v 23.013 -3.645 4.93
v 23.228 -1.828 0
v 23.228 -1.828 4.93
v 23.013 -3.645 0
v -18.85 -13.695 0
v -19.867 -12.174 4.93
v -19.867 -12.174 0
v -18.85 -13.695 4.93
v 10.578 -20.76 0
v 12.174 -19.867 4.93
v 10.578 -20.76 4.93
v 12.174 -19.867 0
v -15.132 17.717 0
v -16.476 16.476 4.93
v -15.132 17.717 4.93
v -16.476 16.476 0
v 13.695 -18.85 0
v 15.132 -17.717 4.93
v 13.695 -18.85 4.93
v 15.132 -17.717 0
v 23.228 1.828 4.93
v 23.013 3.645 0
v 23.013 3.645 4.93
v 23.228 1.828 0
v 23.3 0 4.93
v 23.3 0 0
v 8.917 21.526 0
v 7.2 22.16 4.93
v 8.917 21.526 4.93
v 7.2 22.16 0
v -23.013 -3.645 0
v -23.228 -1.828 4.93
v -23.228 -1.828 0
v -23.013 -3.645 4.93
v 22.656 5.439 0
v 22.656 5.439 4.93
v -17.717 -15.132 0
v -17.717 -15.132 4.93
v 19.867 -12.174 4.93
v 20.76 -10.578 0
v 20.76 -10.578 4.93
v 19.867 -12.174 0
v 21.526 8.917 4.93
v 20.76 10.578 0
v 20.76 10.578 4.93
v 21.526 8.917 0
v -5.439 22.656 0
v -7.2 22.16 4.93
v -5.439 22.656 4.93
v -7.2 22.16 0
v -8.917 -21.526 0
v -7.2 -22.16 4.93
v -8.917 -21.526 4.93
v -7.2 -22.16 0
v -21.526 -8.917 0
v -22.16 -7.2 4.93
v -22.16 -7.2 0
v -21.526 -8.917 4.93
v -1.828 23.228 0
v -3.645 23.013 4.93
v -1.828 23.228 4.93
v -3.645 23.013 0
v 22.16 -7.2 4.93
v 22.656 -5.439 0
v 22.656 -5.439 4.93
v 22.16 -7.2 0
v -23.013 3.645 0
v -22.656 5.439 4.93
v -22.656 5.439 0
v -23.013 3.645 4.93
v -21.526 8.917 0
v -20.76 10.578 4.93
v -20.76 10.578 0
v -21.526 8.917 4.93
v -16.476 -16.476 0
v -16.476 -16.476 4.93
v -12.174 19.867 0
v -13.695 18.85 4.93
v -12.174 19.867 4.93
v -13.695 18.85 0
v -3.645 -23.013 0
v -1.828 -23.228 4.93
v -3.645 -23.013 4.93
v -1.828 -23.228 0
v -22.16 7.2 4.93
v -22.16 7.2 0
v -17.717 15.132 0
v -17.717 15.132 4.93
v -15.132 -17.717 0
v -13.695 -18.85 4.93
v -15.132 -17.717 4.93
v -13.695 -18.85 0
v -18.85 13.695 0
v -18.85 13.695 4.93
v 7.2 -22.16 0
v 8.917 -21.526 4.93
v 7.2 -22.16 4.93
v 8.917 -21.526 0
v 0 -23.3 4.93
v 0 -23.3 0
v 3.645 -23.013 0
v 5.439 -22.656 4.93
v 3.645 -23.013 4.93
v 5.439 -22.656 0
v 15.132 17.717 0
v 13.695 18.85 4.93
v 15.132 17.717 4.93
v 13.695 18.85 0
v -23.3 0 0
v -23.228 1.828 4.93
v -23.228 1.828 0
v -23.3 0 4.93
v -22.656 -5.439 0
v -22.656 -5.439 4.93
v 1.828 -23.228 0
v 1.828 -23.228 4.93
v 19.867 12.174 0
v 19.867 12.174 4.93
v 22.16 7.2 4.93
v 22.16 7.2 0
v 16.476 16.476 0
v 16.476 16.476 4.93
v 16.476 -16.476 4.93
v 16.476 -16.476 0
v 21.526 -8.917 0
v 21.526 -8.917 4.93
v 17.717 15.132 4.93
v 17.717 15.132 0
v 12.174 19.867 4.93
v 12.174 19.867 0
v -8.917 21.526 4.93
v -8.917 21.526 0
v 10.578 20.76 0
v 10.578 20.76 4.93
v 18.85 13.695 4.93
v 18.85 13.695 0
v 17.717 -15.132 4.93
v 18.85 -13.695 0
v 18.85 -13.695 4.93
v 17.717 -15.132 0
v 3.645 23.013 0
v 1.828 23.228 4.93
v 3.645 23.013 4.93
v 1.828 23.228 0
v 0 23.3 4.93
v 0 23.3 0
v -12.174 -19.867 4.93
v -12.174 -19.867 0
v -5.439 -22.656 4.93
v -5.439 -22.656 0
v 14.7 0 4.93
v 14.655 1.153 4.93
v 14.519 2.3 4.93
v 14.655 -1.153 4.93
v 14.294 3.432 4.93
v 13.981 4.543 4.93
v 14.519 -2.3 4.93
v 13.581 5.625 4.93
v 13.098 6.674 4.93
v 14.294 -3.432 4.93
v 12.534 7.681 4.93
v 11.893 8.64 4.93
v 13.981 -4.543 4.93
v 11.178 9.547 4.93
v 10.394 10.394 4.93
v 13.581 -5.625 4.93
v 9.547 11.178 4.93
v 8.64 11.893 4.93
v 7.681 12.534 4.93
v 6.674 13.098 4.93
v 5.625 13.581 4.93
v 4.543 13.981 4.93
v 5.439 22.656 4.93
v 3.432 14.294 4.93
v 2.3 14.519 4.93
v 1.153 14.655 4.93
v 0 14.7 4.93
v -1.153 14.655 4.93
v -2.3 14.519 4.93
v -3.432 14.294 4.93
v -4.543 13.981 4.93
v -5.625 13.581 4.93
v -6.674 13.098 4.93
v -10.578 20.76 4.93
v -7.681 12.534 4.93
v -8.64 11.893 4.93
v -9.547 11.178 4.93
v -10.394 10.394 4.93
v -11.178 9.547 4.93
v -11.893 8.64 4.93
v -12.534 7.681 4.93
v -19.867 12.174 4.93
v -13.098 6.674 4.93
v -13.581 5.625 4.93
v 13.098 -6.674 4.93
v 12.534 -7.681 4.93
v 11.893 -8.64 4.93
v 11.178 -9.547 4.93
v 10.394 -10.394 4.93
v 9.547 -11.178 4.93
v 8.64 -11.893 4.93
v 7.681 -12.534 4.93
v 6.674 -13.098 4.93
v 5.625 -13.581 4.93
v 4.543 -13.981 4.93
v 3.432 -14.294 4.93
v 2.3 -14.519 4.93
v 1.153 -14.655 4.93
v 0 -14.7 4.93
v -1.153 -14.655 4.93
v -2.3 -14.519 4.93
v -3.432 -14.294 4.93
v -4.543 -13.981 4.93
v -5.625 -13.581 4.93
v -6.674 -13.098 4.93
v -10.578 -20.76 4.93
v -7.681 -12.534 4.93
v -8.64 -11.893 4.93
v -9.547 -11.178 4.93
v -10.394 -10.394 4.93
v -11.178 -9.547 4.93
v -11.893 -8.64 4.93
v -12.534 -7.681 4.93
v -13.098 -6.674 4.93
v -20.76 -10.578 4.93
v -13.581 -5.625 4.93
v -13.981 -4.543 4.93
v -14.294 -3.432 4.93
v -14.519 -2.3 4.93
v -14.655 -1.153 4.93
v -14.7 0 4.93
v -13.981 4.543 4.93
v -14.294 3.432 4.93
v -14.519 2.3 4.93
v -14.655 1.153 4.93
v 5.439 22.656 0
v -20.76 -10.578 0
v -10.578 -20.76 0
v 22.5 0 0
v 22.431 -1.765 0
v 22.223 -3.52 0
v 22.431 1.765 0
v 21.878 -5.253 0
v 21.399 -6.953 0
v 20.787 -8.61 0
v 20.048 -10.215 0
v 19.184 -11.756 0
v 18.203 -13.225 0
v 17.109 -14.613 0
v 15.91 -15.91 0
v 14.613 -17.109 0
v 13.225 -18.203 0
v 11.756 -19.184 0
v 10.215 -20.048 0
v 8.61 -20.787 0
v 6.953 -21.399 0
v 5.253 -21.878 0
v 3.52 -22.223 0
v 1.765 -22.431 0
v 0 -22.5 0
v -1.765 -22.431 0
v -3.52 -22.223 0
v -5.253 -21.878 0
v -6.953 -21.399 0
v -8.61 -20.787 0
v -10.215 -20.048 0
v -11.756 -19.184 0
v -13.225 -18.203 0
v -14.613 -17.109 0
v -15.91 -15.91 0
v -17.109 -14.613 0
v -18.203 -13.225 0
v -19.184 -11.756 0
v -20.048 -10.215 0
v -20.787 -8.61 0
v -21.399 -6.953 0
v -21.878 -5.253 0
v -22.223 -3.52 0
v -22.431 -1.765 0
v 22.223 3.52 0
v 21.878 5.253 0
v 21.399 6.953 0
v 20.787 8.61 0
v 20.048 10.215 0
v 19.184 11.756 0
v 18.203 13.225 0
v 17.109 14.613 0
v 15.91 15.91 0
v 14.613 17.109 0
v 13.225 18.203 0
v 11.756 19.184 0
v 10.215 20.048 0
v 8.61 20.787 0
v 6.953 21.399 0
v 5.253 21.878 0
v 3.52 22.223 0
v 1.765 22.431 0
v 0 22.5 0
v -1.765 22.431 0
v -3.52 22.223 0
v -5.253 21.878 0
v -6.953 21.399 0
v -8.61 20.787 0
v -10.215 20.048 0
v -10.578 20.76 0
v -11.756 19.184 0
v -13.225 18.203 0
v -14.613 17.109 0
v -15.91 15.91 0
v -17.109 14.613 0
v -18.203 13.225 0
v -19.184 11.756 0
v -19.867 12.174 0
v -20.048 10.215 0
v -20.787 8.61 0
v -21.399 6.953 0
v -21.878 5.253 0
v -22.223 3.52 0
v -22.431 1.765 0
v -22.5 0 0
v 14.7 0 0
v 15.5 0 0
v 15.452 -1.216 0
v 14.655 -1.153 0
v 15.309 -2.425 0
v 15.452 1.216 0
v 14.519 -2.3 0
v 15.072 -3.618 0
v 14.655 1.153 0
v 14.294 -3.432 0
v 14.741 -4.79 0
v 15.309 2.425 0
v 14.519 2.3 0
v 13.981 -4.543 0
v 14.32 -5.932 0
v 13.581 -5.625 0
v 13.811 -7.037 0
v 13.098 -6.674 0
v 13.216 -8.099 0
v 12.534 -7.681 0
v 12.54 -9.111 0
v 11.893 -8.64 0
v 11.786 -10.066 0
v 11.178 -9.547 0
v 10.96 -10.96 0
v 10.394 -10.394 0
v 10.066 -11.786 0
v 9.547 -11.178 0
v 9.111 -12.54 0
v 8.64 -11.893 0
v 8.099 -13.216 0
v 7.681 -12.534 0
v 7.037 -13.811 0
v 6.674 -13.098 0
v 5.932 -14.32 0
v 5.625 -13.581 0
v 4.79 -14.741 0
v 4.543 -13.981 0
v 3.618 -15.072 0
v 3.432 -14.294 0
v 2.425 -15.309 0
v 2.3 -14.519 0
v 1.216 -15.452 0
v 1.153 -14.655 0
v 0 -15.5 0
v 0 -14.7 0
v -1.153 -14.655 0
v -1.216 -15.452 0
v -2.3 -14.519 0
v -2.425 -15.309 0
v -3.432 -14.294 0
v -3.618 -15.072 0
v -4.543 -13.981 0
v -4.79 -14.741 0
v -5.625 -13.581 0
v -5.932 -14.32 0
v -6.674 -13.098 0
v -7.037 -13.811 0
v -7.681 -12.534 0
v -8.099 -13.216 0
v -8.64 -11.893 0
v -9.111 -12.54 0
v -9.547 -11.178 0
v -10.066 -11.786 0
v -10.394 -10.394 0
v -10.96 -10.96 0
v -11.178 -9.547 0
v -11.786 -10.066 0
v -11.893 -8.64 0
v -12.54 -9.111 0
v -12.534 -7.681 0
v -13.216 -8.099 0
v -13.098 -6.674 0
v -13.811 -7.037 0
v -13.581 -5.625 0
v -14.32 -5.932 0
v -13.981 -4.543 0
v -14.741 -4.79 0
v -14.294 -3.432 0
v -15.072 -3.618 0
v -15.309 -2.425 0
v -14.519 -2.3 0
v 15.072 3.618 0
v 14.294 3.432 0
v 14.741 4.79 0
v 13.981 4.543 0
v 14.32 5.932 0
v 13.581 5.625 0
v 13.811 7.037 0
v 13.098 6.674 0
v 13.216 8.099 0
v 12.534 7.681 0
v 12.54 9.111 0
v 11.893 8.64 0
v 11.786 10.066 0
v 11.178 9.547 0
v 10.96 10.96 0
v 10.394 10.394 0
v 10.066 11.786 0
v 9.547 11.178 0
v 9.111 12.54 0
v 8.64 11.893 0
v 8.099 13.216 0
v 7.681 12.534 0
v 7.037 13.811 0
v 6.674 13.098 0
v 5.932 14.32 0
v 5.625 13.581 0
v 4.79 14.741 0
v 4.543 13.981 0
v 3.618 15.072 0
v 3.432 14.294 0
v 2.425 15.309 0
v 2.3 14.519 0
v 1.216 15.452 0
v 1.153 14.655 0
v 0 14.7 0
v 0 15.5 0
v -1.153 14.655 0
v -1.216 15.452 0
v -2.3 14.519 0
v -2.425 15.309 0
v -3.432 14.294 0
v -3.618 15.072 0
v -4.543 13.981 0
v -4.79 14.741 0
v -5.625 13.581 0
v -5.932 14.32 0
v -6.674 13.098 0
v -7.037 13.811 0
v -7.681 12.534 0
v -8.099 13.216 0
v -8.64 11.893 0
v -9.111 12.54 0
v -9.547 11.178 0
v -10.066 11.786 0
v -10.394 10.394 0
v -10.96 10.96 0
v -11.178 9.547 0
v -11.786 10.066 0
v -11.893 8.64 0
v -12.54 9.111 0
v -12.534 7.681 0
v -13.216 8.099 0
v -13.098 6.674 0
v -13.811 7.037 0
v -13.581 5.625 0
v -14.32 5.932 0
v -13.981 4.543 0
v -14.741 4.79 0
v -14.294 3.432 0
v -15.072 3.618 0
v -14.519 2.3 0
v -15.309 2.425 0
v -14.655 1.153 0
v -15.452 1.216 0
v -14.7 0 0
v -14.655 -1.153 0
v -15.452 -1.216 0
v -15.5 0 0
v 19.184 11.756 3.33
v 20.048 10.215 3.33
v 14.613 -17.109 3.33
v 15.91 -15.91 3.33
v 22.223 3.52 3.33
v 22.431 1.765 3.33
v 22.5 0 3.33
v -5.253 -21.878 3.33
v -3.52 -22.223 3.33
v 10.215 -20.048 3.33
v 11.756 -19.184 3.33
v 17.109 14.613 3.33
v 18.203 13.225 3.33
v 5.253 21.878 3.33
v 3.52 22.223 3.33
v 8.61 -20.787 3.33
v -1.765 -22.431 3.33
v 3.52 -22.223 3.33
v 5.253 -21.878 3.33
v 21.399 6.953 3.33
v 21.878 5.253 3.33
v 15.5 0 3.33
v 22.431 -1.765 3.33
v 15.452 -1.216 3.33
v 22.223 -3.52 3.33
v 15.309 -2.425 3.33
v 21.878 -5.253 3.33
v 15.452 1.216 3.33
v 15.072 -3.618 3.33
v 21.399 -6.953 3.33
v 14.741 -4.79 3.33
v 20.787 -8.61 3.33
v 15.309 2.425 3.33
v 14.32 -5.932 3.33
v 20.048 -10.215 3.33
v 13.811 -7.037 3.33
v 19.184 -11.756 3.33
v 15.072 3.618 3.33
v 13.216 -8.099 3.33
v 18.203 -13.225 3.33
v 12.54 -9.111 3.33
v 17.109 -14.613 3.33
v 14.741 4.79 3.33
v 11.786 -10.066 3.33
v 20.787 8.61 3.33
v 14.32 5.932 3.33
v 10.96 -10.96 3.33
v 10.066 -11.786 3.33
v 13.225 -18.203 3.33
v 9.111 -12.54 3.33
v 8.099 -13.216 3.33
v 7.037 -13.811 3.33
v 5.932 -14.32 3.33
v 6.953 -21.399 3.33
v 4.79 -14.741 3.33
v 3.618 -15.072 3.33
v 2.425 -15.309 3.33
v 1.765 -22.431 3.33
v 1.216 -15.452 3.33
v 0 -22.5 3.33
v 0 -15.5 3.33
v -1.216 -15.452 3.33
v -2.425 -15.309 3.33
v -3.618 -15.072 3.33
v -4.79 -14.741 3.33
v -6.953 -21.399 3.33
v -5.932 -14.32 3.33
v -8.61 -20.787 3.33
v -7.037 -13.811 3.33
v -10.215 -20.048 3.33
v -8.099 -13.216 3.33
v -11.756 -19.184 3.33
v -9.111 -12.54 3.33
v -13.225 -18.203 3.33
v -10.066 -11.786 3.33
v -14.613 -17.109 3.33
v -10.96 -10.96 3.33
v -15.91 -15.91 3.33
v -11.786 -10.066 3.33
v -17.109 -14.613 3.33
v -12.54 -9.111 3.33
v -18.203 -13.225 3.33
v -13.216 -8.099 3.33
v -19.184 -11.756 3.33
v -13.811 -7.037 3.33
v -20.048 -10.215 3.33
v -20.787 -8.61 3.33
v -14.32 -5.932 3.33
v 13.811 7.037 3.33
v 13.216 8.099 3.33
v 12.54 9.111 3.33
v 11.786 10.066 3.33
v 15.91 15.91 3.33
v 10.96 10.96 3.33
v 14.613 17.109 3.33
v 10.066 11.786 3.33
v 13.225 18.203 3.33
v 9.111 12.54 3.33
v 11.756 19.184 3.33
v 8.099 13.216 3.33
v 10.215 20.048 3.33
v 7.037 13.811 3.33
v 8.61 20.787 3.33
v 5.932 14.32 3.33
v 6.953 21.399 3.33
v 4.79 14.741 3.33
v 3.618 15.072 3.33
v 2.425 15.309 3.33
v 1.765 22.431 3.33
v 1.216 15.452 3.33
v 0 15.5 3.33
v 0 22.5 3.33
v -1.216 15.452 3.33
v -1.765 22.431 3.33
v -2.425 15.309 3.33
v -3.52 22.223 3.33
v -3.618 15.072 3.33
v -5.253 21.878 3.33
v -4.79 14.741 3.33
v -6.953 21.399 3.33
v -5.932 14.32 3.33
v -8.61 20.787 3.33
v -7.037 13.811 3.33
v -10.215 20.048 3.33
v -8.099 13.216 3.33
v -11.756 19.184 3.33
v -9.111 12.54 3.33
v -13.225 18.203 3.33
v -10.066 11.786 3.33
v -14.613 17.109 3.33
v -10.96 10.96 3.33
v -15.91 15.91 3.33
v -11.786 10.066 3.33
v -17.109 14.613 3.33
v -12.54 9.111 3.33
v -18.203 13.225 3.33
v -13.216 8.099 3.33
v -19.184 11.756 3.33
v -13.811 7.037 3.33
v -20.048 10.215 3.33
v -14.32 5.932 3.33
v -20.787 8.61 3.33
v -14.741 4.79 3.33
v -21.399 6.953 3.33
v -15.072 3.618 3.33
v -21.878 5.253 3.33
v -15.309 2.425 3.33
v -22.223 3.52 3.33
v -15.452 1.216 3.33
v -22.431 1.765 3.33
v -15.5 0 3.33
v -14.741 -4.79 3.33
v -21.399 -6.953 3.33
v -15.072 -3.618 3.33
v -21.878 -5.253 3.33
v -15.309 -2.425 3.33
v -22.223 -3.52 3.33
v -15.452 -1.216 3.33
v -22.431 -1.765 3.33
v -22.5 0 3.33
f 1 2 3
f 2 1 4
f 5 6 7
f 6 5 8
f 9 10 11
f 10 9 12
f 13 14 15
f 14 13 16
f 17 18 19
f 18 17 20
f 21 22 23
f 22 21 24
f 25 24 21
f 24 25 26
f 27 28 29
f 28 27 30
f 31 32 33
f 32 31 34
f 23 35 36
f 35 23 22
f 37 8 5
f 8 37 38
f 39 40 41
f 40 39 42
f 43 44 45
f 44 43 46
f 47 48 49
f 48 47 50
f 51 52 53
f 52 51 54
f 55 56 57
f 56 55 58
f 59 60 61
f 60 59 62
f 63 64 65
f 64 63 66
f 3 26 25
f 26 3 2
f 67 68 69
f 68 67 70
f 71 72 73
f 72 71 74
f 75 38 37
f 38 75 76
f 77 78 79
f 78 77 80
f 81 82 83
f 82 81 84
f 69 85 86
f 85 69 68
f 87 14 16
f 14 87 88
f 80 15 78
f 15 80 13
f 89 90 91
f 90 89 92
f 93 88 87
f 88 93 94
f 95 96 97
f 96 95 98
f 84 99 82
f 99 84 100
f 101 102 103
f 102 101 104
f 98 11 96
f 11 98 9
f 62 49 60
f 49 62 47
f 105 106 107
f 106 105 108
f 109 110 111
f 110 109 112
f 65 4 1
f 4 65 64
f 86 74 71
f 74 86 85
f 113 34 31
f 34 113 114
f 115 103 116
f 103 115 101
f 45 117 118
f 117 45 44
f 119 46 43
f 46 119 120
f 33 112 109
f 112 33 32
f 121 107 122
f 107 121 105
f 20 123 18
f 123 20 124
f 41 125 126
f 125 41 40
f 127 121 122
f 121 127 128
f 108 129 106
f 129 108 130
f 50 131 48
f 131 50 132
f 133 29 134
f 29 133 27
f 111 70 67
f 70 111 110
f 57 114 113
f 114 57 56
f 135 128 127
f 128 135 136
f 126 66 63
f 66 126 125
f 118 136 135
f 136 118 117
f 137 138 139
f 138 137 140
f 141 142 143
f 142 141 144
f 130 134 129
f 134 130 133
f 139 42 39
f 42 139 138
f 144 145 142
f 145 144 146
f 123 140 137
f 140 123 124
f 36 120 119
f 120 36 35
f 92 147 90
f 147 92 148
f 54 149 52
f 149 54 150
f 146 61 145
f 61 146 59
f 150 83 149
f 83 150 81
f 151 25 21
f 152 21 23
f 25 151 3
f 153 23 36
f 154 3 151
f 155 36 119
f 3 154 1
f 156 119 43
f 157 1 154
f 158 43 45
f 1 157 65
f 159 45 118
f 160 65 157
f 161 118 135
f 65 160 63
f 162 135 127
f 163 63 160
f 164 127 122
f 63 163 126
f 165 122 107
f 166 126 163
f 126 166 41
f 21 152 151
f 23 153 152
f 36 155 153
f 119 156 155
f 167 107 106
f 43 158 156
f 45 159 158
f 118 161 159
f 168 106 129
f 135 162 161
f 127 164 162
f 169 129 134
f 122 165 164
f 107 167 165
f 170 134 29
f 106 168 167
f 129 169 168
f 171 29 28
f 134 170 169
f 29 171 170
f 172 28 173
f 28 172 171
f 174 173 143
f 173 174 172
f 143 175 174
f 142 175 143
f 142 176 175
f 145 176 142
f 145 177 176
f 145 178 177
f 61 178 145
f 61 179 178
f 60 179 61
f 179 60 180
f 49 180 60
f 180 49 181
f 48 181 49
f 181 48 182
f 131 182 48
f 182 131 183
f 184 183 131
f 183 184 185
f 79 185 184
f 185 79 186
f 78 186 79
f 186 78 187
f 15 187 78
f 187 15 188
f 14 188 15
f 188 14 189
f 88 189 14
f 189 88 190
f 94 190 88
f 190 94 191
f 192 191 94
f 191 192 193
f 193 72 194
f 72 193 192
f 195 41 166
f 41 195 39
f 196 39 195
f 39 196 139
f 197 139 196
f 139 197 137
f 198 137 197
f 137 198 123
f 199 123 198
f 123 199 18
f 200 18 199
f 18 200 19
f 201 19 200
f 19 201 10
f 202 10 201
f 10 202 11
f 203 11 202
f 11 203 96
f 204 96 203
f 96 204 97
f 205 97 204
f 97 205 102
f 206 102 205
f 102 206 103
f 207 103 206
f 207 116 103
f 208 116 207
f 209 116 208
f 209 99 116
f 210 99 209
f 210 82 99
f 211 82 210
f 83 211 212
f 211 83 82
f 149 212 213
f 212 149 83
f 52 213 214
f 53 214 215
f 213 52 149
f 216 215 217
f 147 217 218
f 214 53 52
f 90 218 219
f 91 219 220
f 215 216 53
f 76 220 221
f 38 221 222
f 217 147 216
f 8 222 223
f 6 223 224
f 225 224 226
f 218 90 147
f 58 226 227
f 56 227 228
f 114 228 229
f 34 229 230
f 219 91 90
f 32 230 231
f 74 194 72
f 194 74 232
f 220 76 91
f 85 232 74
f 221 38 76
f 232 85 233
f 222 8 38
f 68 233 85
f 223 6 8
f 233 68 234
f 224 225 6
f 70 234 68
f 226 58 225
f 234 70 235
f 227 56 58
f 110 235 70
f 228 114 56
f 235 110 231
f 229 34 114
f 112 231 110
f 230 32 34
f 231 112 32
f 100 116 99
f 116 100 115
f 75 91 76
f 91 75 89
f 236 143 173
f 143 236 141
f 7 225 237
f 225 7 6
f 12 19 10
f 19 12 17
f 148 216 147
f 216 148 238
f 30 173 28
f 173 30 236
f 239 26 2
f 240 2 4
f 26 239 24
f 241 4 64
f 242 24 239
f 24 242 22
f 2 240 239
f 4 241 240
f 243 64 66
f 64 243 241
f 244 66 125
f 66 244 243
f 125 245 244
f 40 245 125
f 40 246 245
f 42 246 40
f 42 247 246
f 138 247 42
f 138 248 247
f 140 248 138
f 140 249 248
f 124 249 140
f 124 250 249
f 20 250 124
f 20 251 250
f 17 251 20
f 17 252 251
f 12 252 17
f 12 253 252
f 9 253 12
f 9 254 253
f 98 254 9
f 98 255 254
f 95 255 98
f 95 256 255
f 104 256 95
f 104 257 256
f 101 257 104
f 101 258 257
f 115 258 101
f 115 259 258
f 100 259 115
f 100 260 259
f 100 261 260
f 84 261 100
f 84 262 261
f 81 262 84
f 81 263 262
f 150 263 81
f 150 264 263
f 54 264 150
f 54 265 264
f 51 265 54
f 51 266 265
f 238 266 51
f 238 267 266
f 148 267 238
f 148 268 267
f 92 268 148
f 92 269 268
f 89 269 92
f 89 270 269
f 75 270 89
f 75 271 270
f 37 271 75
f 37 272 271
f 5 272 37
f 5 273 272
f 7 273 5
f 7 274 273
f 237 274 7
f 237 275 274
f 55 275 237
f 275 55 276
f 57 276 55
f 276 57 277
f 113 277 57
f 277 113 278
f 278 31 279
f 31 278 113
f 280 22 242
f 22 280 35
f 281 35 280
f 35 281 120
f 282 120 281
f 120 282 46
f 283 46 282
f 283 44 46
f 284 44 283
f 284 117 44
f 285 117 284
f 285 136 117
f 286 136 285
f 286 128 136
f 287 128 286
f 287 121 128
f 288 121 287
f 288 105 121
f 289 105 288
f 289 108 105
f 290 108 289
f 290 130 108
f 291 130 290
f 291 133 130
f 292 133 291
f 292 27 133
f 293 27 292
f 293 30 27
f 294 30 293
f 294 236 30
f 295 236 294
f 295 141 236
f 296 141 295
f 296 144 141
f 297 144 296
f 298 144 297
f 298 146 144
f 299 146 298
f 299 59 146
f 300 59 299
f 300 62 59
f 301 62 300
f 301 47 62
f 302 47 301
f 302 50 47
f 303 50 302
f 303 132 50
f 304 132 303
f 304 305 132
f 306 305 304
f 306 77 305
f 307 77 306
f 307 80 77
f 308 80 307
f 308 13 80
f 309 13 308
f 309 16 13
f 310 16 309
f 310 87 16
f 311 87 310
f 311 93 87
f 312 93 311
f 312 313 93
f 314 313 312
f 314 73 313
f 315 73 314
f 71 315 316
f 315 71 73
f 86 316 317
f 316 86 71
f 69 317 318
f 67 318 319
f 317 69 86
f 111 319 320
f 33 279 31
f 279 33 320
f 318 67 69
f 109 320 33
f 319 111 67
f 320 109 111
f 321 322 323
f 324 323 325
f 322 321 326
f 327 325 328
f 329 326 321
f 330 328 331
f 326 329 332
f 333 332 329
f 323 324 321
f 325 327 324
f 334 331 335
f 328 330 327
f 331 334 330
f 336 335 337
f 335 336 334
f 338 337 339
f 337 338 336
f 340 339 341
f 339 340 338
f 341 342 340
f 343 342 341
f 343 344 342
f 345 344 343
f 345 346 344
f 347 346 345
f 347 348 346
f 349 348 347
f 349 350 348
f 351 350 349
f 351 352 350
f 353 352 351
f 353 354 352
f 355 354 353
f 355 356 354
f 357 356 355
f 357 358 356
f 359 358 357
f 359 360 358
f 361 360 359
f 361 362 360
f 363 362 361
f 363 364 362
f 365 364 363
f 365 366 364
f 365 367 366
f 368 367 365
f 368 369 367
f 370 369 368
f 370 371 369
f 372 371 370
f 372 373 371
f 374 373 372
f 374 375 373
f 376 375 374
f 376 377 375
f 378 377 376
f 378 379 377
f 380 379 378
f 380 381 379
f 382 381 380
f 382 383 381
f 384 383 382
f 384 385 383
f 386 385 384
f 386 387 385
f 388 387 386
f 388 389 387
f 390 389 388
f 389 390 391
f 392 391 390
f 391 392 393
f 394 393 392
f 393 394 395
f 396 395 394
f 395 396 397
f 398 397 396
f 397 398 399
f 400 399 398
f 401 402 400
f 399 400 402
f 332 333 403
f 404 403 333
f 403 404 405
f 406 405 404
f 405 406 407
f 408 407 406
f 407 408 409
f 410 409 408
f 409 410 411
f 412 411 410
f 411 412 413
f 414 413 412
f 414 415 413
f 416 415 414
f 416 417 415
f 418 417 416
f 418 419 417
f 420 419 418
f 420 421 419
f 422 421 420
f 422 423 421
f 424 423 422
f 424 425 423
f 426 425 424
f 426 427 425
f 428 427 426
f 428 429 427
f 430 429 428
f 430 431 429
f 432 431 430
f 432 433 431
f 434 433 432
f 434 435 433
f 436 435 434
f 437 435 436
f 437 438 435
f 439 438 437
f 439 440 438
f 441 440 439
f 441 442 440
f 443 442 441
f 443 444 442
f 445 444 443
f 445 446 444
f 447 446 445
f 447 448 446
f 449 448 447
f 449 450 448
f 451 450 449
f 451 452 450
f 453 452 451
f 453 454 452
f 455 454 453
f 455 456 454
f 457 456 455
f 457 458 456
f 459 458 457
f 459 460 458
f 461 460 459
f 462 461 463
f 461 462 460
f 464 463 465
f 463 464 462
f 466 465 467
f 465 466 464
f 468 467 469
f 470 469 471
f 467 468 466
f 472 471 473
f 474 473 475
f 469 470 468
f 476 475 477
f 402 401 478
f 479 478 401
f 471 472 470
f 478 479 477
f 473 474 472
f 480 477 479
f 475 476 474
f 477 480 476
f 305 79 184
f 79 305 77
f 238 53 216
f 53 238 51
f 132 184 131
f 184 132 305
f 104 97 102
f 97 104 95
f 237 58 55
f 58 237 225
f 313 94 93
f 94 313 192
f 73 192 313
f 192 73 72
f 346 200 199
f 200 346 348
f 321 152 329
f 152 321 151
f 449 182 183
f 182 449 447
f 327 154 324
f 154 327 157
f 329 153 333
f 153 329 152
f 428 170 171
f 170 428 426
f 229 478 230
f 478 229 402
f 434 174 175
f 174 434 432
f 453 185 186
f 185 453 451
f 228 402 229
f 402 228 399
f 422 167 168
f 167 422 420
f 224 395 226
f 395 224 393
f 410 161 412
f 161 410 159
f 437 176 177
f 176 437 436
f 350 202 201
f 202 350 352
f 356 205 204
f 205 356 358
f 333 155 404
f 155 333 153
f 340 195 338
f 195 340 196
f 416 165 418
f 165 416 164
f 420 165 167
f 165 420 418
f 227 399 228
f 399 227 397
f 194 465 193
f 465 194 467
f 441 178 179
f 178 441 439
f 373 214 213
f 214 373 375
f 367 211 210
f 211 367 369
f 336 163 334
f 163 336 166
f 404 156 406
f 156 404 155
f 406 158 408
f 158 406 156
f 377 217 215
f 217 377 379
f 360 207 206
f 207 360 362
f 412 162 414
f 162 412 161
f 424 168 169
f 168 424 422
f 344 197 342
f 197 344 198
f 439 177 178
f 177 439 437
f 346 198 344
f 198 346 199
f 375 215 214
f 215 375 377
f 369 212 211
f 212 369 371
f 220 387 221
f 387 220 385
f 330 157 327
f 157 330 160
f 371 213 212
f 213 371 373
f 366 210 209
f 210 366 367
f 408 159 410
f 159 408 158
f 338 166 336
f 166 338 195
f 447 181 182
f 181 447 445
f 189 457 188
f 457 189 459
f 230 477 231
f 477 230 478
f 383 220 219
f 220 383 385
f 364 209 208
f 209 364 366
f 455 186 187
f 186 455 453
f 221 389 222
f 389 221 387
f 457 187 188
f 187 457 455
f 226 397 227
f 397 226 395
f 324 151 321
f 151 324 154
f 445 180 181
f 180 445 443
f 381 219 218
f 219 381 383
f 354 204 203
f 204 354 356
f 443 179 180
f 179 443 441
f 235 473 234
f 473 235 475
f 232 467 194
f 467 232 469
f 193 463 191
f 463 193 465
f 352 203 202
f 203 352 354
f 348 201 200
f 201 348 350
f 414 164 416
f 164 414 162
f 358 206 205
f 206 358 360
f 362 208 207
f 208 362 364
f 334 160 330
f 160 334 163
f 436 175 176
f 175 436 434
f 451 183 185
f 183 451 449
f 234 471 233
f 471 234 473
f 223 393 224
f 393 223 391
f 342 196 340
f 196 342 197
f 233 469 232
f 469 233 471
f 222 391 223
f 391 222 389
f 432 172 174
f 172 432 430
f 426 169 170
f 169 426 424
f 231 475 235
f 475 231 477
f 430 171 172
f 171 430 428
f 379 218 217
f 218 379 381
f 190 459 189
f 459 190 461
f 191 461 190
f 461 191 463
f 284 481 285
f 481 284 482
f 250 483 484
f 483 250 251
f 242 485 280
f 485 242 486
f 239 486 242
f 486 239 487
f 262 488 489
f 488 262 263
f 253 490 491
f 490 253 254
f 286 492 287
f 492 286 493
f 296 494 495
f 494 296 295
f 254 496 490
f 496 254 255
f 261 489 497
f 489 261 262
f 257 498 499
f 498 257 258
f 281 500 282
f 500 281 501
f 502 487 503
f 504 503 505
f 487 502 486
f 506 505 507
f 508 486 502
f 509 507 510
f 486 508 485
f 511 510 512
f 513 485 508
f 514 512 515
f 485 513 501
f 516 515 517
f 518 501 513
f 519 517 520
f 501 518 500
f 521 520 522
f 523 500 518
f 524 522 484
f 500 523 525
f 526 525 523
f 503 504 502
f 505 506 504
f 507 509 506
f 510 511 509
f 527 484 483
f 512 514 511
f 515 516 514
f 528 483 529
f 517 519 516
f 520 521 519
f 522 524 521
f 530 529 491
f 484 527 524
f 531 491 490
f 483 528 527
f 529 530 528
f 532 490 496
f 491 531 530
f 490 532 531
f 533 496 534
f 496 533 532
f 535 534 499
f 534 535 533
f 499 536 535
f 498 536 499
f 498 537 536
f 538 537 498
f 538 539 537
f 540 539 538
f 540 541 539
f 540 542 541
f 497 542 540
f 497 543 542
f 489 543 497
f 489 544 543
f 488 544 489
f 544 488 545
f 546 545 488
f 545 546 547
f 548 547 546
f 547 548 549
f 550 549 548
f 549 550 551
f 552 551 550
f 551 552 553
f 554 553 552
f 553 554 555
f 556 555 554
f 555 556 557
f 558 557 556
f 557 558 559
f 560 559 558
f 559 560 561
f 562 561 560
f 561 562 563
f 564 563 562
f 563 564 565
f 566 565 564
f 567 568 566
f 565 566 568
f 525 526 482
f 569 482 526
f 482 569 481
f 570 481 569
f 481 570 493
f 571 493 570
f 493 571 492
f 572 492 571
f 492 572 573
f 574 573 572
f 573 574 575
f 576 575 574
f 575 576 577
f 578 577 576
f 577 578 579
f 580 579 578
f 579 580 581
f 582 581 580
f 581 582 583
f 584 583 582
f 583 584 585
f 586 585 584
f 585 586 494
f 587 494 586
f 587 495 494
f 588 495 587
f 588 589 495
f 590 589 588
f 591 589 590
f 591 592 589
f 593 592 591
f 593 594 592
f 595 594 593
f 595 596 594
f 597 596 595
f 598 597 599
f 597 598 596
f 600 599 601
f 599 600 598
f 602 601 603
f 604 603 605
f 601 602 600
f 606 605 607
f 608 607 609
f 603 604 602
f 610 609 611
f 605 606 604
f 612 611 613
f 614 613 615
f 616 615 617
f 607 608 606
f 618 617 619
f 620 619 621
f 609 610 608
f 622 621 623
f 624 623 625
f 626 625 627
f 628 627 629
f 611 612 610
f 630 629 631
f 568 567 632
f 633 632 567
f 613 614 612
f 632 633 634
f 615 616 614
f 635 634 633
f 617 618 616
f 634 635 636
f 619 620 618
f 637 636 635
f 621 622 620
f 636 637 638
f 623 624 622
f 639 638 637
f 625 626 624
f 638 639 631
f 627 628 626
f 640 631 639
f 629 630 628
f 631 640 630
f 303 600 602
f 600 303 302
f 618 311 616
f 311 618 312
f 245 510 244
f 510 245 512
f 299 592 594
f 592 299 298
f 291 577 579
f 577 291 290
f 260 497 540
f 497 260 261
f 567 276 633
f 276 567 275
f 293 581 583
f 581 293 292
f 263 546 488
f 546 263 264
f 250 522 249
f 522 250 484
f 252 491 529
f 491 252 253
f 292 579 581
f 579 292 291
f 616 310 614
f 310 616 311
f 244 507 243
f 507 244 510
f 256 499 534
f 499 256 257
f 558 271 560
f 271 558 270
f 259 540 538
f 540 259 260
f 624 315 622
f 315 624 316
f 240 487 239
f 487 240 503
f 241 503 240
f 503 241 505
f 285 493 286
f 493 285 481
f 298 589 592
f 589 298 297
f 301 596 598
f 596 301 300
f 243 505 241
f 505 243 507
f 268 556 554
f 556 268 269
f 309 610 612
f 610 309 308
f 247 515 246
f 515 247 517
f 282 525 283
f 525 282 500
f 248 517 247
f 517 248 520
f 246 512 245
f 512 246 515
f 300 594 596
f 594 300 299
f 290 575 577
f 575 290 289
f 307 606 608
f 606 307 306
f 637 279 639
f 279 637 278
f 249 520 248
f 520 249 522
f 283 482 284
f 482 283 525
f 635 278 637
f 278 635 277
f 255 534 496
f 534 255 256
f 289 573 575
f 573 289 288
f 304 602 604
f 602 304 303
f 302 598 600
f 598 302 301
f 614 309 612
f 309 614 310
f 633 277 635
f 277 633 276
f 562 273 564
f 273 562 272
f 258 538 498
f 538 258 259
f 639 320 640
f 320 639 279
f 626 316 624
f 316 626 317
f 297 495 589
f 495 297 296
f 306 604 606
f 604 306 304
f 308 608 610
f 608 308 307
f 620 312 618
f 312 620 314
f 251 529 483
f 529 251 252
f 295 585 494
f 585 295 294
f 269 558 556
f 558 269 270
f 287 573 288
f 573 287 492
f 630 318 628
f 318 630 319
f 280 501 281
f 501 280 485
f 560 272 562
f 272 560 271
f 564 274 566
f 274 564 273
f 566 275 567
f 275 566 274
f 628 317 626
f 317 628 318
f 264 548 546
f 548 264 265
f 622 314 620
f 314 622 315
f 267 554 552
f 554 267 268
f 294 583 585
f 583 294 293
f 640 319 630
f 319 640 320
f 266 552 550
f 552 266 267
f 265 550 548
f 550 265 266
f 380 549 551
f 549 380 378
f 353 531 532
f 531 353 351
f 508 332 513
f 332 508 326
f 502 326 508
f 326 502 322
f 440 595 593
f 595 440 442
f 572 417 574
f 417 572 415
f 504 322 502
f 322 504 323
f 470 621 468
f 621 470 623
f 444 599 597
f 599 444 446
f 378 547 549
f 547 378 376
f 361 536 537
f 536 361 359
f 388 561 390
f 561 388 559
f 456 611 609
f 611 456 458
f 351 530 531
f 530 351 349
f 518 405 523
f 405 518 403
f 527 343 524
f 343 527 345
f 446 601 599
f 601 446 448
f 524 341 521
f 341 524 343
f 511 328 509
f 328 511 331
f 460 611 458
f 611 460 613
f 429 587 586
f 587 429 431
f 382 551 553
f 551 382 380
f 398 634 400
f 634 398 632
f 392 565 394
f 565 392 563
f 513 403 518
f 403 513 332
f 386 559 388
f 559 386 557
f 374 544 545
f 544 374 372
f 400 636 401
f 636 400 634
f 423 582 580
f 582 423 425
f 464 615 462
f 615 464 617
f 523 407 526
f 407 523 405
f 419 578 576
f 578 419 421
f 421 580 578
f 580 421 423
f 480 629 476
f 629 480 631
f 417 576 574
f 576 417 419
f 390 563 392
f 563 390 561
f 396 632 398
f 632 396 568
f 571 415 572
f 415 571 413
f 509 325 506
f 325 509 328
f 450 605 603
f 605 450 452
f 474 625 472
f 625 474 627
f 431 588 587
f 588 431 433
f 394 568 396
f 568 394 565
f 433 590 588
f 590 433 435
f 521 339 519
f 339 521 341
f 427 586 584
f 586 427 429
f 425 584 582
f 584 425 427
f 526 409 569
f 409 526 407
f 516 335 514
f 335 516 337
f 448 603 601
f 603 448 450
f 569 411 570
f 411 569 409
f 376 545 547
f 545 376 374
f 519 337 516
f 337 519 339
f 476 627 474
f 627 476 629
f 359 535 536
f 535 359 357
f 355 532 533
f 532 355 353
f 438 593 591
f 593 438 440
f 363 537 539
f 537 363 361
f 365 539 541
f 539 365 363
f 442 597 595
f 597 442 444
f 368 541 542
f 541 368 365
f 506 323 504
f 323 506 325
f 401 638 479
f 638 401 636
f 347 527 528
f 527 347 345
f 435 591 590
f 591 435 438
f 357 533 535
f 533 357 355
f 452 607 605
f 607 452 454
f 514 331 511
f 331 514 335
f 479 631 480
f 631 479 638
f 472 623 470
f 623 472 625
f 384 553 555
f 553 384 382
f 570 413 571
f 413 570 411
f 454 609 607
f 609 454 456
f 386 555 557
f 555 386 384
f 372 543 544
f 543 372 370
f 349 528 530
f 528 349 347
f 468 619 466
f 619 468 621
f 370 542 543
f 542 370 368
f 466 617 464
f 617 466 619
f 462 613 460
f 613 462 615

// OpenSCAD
// For building the part that clips on the LED ring
ring_inside = 31/2;
ring_outside = 45/2;
inside_height = 3.33;

wall_thickness = 0.4 * 2; // 2x extusion width
//$fs=0.01;
$fn=80;

//============================================================================

module led_ring(r1,r2,h) {
	difference() {
		cylinder(r=r2, h=h);
		translate([0,0,-0.5]) cylinder(r=r1, h=h+1);
	}
}

// build as a shell
// Round top
difference() {
union() {
	torus_r_outside=((ring_outside-ring_inside) + wall_thickness*2)/2;
	torus_r_inside=(ring_outside-ring_inside)/2;
	difference() {
		rotate_extrude()
			translate([ring_inside+torus_r_outside-wall_thickness,0,0])
				circle(torus_r_outside);

		rotate_extrude() translate([ring_inside+torus_r_inside,0,0]) circle(torus_r_inside);

		translate([0,0,-torus_r_outside])
			cylinder(r=ring_outside+wall_thickness+1, h=torus_r_outside);
	}

	difference() {
		translate([0,0,-inside_height]) led_ring(ring_inside-wall_thickness, ring_outside+wall_thickness, inside_height);
		translate([0,0,-inside_height-0.5]) led_ring(ring_inside, ring_outside, inside_height+1);
	}
}

	translate([0,0,-(inside_height + 3)])
		cylinder(r=ring_outside+wall_thickness+1, h=3);
}

// Flat top
!difference() {
// TODO: add lip or tabs to lock on to led ring?
	led_ring(ring_inside-wall_thickness, ring_outside+wall_thickness, inside_height+wall_thickness*2);
	translate([0,0,-0.5]) led_ring(ring_inside, ring_outside, inside_height+0.5);
}

// vim: set sw=2 ts=2 :
